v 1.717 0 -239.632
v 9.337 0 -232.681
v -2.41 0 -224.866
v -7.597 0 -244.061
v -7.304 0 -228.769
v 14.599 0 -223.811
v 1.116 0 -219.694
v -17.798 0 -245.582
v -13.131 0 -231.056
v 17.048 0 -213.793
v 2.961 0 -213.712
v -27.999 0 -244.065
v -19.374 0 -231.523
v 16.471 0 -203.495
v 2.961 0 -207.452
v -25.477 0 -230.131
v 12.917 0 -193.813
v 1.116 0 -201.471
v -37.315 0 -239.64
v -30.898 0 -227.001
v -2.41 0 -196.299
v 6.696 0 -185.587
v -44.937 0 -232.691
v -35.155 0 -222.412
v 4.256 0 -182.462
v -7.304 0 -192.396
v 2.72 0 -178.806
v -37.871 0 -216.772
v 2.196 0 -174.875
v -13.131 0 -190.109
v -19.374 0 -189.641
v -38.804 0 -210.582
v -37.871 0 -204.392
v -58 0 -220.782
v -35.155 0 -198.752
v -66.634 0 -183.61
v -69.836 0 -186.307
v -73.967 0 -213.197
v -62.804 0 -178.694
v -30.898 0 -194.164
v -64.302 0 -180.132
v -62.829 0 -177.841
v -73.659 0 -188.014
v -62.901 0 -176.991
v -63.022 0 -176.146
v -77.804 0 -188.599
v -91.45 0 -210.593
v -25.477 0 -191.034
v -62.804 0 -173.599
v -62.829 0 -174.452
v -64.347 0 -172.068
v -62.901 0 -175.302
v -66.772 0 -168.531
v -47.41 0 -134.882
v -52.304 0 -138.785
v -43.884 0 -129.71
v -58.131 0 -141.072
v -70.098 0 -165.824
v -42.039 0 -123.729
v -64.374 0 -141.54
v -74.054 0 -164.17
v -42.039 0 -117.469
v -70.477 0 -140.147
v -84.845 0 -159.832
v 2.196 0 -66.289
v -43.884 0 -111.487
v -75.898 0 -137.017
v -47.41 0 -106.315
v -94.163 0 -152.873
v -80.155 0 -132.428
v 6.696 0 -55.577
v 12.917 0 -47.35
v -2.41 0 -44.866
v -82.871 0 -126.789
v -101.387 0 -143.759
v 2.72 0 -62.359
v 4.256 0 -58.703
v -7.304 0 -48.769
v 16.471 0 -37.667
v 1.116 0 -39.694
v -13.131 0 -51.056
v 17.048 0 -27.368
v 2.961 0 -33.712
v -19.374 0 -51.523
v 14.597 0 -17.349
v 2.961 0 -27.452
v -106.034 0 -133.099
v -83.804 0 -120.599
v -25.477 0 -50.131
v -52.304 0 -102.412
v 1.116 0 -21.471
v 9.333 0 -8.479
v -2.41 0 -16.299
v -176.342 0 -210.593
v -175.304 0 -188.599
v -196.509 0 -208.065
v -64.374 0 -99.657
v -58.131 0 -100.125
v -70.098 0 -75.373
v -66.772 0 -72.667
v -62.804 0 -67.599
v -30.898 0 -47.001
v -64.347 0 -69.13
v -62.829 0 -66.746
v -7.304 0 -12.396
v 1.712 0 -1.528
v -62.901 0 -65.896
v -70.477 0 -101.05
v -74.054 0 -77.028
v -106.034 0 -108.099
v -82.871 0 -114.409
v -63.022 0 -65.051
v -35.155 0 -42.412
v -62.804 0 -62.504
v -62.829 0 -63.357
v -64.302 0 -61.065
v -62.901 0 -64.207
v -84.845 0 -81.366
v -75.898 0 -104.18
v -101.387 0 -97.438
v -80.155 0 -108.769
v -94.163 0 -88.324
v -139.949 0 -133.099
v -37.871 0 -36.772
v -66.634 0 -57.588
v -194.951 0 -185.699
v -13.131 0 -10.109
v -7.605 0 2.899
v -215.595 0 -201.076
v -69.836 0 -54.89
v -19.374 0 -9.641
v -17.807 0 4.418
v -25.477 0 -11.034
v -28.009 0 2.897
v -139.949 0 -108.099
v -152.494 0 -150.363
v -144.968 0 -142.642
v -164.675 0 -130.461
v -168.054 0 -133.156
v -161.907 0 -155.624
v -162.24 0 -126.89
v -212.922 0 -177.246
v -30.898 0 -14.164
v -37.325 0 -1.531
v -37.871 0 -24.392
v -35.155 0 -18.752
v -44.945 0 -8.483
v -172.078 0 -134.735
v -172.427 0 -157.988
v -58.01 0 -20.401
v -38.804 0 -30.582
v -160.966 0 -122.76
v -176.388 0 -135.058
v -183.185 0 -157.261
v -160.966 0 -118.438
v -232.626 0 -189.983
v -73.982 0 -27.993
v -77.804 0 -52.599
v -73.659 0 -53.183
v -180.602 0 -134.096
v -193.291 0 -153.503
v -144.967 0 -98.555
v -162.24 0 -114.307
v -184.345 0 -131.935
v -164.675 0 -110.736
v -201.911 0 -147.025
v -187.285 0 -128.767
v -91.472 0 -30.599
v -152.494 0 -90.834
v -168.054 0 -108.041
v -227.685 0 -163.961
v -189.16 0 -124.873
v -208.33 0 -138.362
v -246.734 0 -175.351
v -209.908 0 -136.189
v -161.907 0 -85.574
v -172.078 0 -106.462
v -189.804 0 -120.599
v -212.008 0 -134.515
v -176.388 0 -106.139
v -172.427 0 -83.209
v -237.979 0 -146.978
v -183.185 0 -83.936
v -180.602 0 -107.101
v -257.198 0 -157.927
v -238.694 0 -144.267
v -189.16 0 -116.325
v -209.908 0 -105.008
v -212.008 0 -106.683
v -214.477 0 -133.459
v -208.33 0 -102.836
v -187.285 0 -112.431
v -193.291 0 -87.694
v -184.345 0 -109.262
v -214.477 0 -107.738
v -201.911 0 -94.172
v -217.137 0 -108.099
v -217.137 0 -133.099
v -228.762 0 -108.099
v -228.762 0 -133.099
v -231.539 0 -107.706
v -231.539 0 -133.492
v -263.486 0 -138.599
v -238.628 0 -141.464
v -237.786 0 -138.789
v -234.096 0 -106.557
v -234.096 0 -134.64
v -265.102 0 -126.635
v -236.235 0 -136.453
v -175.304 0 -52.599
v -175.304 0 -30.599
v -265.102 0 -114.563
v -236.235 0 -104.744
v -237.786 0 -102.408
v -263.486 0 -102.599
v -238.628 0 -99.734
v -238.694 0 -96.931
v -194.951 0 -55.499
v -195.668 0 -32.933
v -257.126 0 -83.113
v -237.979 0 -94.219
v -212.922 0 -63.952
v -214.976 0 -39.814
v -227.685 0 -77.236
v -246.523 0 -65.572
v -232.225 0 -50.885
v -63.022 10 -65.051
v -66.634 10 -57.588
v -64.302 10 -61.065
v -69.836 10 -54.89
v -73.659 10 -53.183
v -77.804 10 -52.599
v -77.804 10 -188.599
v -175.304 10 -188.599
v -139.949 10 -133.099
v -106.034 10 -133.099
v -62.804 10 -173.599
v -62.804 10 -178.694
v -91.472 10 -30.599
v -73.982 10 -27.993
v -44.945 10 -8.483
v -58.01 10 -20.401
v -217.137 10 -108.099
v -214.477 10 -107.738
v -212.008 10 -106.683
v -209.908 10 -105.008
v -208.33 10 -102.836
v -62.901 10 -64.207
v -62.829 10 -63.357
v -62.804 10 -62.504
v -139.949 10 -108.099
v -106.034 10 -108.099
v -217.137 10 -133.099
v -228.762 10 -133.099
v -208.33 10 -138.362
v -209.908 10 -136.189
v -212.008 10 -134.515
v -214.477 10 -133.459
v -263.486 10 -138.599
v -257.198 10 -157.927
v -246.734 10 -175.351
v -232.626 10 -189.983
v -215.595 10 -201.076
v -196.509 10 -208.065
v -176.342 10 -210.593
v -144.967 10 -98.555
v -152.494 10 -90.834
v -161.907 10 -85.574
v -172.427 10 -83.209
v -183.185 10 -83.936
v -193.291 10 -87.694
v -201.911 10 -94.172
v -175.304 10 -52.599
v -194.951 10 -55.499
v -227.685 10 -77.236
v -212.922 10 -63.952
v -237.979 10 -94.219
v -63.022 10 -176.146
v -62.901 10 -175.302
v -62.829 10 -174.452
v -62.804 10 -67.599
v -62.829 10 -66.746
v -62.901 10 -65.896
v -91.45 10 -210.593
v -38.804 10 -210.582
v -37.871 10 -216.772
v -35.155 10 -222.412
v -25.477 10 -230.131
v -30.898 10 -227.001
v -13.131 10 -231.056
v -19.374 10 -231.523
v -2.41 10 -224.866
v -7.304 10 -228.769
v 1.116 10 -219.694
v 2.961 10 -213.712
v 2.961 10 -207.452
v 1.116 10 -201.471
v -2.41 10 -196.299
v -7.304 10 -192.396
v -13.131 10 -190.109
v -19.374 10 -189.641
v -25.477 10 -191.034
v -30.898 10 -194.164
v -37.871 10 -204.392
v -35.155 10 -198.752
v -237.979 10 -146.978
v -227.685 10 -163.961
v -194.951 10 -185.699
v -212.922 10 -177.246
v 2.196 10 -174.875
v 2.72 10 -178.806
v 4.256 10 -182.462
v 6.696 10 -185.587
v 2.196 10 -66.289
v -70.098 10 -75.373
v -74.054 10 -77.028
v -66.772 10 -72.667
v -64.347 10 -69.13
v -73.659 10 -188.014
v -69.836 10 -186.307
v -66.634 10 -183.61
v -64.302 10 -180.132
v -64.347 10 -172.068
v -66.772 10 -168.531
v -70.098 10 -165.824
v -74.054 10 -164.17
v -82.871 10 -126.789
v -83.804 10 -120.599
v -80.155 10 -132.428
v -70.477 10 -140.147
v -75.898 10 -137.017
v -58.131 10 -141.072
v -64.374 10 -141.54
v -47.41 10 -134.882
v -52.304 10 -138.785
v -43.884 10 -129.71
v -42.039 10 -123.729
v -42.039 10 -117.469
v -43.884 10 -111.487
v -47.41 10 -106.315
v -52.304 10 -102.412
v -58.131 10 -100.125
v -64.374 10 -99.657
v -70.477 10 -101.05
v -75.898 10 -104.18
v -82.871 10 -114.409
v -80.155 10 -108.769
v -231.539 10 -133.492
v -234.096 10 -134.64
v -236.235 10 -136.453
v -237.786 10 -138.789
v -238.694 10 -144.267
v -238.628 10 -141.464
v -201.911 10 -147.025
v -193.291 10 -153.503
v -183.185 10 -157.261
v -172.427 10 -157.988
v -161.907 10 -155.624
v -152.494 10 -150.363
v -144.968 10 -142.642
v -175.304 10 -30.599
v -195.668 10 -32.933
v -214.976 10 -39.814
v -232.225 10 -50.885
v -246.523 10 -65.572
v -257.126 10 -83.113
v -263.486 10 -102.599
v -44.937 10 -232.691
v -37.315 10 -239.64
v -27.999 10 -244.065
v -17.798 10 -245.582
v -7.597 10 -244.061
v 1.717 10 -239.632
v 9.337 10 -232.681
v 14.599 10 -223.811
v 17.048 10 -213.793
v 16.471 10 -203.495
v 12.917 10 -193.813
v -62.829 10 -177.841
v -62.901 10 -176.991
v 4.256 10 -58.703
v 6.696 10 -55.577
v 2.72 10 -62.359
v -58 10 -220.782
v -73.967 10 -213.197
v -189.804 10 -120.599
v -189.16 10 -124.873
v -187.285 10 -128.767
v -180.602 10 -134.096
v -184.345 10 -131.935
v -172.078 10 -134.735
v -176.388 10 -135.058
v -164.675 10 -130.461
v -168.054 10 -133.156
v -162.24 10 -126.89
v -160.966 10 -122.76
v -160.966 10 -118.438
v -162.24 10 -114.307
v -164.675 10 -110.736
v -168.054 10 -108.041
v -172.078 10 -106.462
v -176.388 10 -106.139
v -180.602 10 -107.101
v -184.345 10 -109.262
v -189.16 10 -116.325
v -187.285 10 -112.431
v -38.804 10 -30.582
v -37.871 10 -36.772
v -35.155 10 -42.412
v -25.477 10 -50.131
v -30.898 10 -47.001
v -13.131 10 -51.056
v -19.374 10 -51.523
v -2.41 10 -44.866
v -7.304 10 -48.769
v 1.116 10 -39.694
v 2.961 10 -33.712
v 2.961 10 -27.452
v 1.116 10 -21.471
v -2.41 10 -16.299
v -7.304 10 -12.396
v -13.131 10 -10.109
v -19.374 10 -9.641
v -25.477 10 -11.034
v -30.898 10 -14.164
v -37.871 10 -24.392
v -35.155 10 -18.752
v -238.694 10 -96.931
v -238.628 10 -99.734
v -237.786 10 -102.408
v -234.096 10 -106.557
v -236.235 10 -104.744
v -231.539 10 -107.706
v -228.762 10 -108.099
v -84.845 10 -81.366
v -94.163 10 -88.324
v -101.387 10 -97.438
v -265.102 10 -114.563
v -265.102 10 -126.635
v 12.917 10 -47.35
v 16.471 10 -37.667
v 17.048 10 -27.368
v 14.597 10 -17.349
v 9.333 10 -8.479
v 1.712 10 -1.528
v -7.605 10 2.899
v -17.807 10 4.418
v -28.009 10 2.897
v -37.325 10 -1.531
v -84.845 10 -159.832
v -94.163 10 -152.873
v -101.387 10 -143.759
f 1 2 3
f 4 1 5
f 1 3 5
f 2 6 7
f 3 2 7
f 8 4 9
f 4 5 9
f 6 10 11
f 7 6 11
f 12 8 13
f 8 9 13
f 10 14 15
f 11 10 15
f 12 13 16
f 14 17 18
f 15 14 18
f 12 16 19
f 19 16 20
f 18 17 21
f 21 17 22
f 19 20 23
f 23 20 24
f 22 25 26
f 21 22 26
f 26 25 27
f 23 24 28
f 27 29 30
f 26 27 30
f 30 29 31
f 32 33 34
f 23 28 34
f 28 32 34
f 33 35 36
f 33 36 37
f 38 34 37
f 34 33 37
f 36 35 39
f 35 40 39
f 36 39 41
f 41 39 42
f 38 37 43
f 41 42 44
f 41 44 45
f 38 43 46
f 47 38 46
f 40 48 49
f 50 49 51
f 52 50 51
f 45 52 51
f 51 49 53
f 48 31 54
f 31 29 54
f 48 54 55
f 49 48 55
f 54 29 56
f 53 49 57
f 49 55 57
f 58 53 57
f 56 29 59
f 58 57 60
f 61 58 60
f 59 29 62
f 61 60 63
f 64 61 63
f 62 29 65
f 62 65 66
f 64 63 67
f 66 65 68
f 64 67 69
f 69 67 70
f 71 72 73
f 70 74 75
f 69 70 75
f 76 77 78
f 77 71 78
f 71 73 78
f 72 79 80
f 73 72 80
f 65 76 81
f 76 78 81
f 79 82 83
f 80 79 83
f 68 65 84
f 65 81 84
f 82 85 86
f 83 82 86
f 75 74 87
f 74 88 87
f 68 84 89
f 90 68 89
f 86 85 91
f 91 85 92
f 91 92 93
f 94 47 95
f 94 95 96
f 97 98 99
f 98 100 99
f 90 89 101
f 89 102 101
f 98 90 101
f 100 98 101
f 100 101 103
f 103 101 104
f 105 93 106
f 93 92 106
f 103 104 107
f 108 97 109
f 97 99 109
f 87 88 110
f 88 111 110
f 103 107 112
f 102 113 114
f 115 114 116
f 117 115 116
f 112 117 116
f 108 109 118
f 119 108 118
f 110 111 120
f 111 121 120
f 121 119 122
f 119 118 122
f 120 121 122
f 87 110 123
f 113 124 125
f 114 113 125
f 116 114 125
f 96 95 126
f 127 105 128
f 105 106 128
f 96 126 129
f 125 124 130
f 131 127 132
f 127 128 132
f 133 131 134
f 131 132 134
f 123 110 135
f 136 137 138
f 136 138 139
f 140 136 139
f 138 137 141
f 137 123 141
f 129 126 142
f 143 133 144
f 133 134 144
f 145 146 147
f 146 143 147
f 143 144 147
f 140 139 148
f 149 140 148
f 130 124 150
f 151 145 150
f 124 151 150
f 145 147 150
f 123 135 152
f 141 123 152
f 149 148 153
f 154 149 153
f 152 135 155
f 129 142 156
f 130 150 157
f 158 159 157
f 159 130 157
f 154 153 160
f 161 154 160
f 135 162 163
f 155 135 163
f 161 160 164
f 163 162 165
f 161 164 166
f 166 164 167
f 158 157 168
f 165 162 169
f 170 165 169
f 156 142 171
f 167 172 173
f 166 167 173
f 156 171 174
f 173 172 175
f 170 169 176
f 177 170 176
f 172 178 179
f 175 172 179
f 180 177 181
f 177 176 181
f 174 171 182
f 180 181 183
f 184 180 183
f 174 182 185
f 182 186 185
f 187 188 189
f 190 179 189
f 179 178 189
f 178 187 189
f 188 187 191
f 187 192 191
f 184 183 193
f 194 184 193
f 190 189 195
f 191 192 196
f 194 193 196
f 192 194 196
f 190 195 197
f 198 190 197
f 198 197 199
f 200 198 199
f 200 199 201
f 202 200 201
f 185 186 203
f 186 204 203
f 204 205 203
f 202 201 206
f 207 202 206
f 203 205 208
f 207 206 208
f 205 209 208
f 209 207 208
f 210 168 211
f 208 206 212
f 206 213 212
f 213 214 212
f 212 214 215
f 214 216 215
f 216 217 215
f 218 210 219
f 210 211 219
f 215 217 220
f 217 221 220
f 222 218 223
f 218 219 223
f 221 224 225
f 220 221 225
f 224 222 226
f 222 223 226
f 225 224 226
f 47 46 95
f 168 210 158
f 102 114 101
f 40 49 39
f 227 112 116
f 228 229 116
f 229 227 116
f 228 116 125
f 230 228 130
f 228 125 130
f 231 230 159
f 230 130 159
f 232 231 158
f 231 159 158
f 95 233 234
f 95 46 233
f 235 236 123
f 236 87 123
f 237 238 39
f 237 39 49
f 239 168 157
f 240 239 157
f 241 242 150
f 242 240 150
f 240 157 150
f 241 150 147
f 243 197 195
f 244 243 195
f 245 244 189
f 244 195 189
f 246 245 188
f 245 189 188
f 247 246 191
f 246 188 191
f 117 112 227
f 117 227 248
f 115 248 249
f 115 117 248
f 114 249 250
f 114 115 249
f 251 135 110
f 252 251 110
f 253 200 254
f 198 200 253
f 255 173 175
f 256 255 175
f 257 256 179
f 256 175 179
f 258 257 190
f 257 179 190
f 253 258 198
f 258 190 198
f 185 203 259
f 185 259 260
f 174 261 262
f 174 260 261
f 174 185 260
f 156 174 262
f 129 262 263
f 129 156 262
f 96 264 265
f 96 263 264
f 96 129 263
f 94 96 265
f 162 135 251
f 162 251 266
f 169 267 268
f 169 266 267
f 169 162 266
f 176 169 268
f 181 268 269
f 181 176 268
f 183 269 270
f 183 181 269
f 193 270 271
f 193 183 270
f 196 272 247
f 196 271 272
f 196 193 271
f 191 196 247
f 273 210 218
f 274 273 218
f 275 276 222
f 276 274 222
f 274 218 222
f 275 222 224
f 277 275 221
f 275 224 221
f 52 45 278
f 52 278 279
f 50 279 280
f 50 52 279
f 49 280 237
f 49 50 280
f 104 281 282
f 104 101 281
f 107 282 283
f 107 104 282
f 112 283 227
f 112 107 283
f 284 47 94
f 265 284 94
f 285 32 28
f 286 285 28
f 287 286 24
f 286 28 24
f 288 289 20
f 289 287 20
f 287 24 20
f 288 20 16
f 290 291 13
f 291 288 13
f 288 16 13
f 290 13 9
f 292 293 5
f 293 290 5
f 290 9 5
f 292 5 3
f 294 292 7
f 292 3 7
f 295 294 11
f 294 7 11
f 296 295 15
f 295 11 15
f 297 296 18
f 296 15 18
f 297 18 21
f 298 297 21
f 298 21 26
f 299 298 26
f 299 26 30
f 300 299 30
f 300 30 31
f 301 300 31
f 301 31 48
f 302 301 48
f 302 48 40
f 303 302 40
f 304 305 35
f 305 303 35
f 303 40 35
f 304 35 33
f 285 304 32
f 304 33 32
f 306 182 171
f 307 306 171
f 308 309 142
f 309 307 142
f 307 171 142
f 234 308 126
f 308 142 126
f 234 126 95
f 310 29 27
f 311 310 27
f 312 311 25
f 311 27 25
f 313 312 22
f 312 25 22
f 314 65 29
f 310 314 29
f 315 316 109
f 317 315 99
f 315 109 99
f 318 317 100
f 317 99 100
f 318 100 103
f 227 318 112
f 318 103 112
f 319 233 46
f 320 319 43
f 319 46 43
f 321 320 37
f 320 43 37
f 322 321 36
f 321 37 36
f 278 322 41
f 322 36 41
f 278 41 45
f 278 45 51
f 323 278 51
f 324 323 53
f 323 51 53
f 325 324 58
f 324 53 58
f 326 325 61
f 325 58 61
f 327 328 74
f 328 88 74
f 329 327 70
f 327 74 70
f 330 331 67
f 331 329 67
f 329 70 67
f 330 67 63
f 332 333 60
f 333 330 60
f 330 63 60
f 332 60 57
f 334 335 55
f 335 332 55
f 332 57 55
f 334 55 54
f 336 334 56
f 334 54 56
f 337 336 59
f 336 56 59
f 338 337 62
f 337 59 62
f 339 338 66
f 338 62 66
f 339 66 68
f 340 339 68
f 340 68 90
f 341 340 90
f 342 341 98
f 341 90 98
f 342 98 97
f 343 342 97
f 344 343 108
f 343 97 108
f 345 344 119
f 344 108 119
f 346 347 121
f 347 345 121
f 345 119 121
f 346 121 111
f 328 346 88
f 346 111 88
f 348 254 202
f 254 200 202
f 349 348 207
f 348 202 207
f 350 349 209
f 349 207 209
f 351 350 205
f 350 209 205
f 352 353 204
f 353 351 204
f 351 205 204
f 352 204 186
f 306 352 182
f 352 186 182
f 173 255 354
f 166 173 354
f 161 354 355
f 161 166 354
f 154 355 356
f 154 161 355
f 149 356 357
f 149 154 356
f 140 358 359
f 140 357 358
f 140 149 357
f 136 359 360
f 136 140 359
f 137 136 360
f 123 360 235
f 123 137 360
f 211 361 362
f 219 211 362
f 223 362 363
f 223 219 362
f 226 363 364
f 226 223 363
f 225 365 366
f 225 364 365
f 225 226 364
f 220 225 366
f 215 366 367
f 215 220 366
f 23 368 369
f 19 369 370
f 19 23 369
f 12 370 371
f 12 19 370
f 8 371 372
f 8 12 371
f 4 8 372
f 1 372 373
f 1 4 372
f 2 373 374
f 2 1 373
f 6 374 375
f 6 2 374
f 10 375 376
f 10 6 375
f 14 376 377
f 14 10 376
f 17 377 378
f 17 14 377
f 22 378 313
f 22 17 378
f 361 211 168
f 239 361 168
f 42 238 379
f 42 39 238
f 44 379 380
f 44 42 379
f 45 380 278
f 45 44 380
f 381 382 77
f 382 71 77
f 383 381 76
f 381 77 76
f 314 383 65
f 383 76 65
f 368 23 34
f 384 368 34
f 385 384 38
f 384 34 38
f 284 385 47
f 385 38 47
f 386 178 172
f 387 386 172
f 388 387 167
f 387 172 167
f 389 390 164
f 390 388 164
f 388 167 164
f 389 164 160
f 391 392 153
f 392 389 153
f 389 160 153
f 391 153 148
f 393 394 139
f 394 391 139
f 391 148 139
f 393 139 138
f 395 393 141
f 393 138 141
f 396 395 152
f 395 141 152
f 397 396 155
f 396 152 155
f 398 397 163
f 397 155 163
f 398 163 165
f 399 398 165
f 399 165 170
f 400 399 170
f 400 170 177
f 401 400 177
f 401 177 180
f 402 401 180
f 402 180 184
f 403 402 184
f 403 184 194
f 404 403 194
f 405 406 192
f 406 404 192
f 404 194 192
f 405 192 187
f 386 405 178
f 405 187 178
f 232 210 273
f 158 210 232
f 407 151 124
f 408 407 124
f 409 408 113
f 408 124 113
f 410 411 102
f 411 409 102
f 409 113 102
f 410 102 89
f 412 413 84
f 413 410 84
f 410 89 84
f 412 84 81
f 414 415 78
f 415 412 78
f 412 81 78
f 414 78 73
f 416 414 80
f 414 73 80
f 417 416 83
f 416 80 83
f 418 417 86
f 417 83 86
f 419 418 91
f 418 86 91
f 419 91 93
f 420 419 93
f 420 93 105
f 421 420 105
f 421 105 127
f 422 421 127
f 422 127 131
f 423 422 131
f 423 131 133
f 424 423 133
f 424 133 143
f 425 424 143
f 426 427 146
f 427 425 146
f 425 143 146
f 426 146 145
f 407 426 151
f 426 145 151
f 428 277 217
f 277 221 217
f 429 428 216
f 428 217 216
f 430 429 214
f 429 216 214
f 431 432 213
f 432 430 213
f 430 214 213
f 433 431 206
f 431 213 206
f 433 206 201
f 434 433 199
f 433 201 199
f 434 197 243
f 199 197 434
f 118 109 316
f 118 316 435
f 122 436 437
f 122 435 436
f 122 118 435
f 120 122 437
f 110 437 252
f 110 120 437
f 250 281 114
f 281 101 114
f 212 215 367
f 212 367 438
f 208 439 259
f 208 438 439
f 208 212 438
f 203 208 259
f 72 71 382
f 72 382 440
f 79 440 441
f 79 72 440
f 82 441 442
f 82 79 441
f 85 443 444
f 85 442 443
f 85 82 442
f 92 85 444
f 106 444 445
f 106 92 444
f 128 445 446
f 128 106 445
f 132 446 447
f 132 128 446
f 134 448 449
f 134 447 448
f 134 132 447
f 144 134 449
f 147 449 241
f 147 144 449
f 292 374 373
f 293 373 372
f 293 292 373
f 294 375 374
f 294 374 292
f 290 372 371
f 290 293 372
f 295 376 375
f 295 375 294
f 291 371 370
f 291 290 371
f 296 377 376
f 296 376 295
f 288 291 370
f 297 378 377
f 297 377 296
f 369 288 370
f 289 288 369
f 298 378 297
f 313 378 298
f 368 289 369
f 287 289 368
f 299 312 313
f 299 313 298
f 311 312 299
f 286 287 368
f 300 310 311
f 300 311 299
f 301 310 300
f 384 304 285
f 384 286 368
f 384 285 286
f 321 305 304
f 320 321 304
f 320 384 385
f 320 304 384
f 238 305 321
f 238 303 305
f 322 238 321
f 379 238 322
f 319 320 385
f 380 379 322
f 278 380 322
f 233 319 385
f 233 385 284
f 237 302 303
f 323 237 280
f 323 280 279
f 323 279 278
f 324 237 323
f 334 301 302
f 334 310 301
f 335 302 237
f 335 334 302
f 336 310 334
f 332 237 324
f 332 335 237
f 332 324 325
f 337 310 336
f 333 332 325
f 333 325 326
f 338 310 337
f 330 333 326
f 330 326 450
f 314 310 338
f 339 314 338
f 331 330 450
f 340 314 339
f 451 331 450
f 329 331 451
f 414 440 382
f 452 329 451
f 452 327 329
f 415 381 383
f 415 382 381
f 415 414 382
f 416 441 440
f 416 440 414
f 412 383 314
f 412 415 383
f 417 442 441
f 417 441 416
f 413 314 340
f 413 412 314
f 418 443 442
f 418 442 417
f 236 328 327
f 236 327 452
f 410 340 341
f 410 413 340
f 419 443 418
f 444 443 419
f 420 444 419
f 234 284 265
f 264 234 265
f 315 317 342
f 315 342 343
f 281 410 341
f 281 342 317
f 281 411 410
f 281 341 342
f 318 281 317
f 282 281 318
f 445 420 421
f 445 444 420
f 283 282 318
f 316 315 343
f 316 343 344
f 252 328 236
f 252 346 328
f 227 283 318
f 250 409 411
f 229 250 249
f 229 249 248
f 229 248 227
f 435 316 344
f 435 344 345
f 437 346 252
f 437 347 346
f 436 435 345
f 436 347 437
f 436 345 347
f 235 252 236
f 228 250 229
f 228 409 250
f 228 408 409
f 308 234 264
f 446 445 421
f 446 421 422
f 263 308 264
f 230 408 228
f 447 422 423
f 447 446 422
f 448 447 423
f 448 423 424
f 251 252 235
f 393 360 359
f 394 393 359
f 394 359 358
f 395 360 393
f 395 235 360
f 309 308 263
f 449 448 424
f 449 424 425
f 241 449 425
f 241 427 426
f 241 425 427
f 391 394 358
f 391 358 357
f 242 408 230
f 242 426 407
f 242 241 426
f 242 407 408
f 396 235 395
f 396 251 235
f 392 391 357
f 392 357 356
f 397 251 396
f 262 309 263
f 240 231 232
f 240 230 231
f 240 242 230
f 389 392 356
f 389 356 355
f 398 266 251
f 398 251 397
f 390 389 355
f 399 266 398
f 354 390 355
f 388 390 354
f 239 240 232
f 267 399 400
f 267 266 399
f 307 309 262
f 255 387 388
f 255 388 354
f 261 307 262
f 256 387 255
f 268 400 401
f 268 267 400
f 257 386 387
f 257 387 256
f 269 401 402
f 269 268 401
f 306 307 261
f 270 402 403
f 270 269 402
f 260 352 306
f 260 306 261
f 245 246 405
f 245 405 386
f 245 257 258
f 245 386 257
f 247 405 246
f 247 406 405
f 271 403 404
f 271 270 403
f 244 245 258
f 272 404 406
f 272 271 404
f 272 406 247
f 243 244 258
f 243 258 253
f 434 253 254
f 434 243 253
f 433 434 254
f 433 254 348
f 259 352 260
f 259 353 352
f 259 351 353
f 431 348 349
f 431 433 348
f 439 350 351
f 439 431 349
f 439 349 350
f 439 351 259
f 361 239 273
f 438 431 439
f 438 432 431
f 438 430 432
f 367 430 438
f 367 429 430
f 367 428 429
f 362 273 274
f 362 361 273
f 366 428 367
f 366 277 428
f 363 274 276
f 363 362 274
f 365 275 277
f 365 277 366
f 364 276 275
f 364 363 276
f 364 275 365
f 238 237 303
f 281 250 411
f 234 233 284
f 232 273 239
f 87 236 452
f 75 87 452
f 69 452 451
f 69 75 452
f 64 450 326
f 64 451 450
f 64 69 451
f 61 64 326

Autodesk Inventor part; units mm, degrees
ref_plane "YZ Plane" through (0, 0, 0) normal (1, 0, 0) x (0, 1, 0)
ref_plane "XZ Plane" through (0, 0, 0) normal (0, 1, 0) x (-1, 0, 0)
ref_plane "XY Plane" through (0, 0, 0) normal (0, 0, 1) x (1, 0, 0)
sketch "Sketch1" plane through (0, 0, 0) normal (0, 1, 0) x (-1, 0, 0)
  arc A0 (176.3419, -210.5927) -> (175.3044, -30.5987) centre (175.3044, -120.5987) ccw
  line L0 (175.3044, -30.5987) -> (91.4725, -30.5987)
  line L1 (-2.1956, -66.2894) -> (-2.1956, -174.8751)
  line L2 (91.4505, -210.5927) -> (176.3419, -210.5927)
  arc A1 (44.9453, -8.483) -> (-6.6956, -55.5772) centre (17.8044, -30.5822) ccw
  arc A2 (-6.6956, -185.5872) -> (44.9372, -232.6914) centre (17.8044, -210.5822) ccw
  line L3 (265.3044, -138.5987) -> (263.4861, -138.5987)
  line L4 (263.4861, -102.5987) -> (265.3044, -102.5987)
  circle A3 centre (175.3044, -120.5987) radius 14.5
  line L5 (175.3044, -52.5987) -> (77.8044, -52.5987)
  line L6 (77.8044, -188.5987) -> (175.3044, -188.5987)
  arc A4 (237.9792, -94.2194) -> (175.3044, -52.5987) centre (175.3044, -120.5987) ccw
  arc A5 (175.3044, -188.5987) -> (237.9792, -146.978) centre (175.3044, -120.5987) ccw
  line L7 (228.7624, -133.0987) -> (217.1374, -133.0987)
  line L8 (217.1374, -108.0987) -> (228.7624, -108.0987)
  line L9 (139.9491, -108.0987) -> (106.0335, -108.0987)
  line L10 (106.0335, -133.0987) -> (139.9491, -133.0987)
  arc A6 (208.3305, -102.8356) -> (139.9491, -108.0987) centre (175.3044, -120.5987) ccw
  arc A7 (139.9491, -133.0987) -> (208.3305, -138.3619) centre (175.3044, -120.5987) ccw
  line L11 (62.8044, -67.5987) -> (62.8044, -62.504)
  line L12 (62.8044, -178.6935) -> (62.8044, -173.5987)
  arc A8 (106.0335, -108.0987) -> (74.0544, -77.0277) centre (62.8044, -120.5987) ccw
  arc A9 (74.0544, -164.1698) -> (106.0335, -133.0987) centre (62.8044, -120.5987) ccw
  circle A10 centre (62.8044, -120.5987) radius 21
  circle A11 centre (17.8044, -30.5822) radius 21
  circle A12 centre (17.8044, -210.5822) radius 21
  arc A13 (239.6919, -108.0987) -> (241.6431, -105.6593) centre (239.6919, -106.0987) ccw
  arc A14 (228.7624, -108.0987) -> (237.9792, -94.2194) centre (228.7624, -98.0987) ccw
  arc A15 (208.3305, -102.8356) -> (217.1374, -108.0987) centre (217.1374, -98.0987) ccw
  arc A16 (217.1374, -133.0987) -> (208.3305, -138.3619) centre (217.1374, -143.0987) ccw
  arc A17 (237.9792, -146.978) -> (228.7624, -133.0987) centre (228.7624, -143.0987) ccw
  arc A18 (77.8044, -52.5987) -> (62.8044, -67.5987) centre (77.8044, -67.5987) ccw
  arc A19 (62.8044, -173.5987) -> (77.8044, -188.5987) centre (77.8044, -173.5987) ccw
  arc A20 (62.8044, -62.504) -> (74.0544, -77.0277) centre (77.8044, -62.504) ccw
  arc A21 (74.0544, -164.1698) -> (62.8044, -178.6935) centre (77.8044, -178.6935) ccw
  arc A22 (44.9453, -8.483) -> (91.4725, -30.5987) centre (91.4725, 29.4013) ccw
  arc A23 (91.4505, -210.5927) -> (44.9372, -232.6914) centre (91.4505, -270.5927) ccw
  arc A24 (-2.1956, -66.2894) -> (-6.6956, -55.5772) centre (-17.1956, -66.2894) ccw
  arc A25 (-6.6956, -185.5872) -> (-2.1956, -174.8751) centre (-17.1956, -174.8751) ccw
  point P0 (0, 0)
  point P1 (-2.1956, -181.8594)
  point P2 (242.1457, -108.0987)
  point P3 (242.1457, -133.0987)
  point P4 (62.8044, -188.5987)
  point P5 (210.6598, -108.0987)
  point P6 (210.6598, -133.0987)
  point P7 (62.8044, -52.5987)
  point P8 (62.8044, -75.5987)
  point P9 (62.8044, -165.5987)
  point P10 (-2.1956, -59.3051)
  point P11 (52.8044, -30.5987)
  point P12 (52.8044, -210.5927)
  point P13 (63.0223, -65.0513)
  point P14 (63.0223, -176.1461)
  dimension "d0" = 180
  dimension "d1" = 20
  dimension "d2" = 20
  dimension "d3" = 42
  dimension "d4" = 70
  dimension "d5" = 42
  dimension "d6" = 70
  dimension "d7" = 112.5
  dimension "d8" = 90
  dimension "d9" = 90
  dimension "d10" = 25
  dimension "d11" = 90
  dimension "d12" = 68
  dimension "d13" = 77.5
  dimension "d14" = 37.5
  dimension "d15" = 37.5
  dimension "d16" = 29
  dimension "d17" = 45
  dimension "d18" = 45
  dimension "d19" = 42
  dimension "d20" = 25
  dimension "d21" = 77.5
  dimension "d22" = 112.5
  dimension "d23" = 112.5
  dimension "d24" = 45
  dimension "d25" = 68
  dimension "d26" = 2
  dimension "d27" = 10
  dimension "d28" = 15
  dimension "d29" = 60
extrude "Extrusion1" add sketch "Sketch1" along normal blind 10
equation "\"d2\" = d1"
equation "\"d5\" = d3"
equation "\"d6\" = d4"
equation "\"d15\" = d14"
equation "\"d18\" = d17"
equation "\"d20\" = d10"
equation "\"d21\" = d13"
equation "\"d23\" = d22"
equation "\"d25\" = d12"
